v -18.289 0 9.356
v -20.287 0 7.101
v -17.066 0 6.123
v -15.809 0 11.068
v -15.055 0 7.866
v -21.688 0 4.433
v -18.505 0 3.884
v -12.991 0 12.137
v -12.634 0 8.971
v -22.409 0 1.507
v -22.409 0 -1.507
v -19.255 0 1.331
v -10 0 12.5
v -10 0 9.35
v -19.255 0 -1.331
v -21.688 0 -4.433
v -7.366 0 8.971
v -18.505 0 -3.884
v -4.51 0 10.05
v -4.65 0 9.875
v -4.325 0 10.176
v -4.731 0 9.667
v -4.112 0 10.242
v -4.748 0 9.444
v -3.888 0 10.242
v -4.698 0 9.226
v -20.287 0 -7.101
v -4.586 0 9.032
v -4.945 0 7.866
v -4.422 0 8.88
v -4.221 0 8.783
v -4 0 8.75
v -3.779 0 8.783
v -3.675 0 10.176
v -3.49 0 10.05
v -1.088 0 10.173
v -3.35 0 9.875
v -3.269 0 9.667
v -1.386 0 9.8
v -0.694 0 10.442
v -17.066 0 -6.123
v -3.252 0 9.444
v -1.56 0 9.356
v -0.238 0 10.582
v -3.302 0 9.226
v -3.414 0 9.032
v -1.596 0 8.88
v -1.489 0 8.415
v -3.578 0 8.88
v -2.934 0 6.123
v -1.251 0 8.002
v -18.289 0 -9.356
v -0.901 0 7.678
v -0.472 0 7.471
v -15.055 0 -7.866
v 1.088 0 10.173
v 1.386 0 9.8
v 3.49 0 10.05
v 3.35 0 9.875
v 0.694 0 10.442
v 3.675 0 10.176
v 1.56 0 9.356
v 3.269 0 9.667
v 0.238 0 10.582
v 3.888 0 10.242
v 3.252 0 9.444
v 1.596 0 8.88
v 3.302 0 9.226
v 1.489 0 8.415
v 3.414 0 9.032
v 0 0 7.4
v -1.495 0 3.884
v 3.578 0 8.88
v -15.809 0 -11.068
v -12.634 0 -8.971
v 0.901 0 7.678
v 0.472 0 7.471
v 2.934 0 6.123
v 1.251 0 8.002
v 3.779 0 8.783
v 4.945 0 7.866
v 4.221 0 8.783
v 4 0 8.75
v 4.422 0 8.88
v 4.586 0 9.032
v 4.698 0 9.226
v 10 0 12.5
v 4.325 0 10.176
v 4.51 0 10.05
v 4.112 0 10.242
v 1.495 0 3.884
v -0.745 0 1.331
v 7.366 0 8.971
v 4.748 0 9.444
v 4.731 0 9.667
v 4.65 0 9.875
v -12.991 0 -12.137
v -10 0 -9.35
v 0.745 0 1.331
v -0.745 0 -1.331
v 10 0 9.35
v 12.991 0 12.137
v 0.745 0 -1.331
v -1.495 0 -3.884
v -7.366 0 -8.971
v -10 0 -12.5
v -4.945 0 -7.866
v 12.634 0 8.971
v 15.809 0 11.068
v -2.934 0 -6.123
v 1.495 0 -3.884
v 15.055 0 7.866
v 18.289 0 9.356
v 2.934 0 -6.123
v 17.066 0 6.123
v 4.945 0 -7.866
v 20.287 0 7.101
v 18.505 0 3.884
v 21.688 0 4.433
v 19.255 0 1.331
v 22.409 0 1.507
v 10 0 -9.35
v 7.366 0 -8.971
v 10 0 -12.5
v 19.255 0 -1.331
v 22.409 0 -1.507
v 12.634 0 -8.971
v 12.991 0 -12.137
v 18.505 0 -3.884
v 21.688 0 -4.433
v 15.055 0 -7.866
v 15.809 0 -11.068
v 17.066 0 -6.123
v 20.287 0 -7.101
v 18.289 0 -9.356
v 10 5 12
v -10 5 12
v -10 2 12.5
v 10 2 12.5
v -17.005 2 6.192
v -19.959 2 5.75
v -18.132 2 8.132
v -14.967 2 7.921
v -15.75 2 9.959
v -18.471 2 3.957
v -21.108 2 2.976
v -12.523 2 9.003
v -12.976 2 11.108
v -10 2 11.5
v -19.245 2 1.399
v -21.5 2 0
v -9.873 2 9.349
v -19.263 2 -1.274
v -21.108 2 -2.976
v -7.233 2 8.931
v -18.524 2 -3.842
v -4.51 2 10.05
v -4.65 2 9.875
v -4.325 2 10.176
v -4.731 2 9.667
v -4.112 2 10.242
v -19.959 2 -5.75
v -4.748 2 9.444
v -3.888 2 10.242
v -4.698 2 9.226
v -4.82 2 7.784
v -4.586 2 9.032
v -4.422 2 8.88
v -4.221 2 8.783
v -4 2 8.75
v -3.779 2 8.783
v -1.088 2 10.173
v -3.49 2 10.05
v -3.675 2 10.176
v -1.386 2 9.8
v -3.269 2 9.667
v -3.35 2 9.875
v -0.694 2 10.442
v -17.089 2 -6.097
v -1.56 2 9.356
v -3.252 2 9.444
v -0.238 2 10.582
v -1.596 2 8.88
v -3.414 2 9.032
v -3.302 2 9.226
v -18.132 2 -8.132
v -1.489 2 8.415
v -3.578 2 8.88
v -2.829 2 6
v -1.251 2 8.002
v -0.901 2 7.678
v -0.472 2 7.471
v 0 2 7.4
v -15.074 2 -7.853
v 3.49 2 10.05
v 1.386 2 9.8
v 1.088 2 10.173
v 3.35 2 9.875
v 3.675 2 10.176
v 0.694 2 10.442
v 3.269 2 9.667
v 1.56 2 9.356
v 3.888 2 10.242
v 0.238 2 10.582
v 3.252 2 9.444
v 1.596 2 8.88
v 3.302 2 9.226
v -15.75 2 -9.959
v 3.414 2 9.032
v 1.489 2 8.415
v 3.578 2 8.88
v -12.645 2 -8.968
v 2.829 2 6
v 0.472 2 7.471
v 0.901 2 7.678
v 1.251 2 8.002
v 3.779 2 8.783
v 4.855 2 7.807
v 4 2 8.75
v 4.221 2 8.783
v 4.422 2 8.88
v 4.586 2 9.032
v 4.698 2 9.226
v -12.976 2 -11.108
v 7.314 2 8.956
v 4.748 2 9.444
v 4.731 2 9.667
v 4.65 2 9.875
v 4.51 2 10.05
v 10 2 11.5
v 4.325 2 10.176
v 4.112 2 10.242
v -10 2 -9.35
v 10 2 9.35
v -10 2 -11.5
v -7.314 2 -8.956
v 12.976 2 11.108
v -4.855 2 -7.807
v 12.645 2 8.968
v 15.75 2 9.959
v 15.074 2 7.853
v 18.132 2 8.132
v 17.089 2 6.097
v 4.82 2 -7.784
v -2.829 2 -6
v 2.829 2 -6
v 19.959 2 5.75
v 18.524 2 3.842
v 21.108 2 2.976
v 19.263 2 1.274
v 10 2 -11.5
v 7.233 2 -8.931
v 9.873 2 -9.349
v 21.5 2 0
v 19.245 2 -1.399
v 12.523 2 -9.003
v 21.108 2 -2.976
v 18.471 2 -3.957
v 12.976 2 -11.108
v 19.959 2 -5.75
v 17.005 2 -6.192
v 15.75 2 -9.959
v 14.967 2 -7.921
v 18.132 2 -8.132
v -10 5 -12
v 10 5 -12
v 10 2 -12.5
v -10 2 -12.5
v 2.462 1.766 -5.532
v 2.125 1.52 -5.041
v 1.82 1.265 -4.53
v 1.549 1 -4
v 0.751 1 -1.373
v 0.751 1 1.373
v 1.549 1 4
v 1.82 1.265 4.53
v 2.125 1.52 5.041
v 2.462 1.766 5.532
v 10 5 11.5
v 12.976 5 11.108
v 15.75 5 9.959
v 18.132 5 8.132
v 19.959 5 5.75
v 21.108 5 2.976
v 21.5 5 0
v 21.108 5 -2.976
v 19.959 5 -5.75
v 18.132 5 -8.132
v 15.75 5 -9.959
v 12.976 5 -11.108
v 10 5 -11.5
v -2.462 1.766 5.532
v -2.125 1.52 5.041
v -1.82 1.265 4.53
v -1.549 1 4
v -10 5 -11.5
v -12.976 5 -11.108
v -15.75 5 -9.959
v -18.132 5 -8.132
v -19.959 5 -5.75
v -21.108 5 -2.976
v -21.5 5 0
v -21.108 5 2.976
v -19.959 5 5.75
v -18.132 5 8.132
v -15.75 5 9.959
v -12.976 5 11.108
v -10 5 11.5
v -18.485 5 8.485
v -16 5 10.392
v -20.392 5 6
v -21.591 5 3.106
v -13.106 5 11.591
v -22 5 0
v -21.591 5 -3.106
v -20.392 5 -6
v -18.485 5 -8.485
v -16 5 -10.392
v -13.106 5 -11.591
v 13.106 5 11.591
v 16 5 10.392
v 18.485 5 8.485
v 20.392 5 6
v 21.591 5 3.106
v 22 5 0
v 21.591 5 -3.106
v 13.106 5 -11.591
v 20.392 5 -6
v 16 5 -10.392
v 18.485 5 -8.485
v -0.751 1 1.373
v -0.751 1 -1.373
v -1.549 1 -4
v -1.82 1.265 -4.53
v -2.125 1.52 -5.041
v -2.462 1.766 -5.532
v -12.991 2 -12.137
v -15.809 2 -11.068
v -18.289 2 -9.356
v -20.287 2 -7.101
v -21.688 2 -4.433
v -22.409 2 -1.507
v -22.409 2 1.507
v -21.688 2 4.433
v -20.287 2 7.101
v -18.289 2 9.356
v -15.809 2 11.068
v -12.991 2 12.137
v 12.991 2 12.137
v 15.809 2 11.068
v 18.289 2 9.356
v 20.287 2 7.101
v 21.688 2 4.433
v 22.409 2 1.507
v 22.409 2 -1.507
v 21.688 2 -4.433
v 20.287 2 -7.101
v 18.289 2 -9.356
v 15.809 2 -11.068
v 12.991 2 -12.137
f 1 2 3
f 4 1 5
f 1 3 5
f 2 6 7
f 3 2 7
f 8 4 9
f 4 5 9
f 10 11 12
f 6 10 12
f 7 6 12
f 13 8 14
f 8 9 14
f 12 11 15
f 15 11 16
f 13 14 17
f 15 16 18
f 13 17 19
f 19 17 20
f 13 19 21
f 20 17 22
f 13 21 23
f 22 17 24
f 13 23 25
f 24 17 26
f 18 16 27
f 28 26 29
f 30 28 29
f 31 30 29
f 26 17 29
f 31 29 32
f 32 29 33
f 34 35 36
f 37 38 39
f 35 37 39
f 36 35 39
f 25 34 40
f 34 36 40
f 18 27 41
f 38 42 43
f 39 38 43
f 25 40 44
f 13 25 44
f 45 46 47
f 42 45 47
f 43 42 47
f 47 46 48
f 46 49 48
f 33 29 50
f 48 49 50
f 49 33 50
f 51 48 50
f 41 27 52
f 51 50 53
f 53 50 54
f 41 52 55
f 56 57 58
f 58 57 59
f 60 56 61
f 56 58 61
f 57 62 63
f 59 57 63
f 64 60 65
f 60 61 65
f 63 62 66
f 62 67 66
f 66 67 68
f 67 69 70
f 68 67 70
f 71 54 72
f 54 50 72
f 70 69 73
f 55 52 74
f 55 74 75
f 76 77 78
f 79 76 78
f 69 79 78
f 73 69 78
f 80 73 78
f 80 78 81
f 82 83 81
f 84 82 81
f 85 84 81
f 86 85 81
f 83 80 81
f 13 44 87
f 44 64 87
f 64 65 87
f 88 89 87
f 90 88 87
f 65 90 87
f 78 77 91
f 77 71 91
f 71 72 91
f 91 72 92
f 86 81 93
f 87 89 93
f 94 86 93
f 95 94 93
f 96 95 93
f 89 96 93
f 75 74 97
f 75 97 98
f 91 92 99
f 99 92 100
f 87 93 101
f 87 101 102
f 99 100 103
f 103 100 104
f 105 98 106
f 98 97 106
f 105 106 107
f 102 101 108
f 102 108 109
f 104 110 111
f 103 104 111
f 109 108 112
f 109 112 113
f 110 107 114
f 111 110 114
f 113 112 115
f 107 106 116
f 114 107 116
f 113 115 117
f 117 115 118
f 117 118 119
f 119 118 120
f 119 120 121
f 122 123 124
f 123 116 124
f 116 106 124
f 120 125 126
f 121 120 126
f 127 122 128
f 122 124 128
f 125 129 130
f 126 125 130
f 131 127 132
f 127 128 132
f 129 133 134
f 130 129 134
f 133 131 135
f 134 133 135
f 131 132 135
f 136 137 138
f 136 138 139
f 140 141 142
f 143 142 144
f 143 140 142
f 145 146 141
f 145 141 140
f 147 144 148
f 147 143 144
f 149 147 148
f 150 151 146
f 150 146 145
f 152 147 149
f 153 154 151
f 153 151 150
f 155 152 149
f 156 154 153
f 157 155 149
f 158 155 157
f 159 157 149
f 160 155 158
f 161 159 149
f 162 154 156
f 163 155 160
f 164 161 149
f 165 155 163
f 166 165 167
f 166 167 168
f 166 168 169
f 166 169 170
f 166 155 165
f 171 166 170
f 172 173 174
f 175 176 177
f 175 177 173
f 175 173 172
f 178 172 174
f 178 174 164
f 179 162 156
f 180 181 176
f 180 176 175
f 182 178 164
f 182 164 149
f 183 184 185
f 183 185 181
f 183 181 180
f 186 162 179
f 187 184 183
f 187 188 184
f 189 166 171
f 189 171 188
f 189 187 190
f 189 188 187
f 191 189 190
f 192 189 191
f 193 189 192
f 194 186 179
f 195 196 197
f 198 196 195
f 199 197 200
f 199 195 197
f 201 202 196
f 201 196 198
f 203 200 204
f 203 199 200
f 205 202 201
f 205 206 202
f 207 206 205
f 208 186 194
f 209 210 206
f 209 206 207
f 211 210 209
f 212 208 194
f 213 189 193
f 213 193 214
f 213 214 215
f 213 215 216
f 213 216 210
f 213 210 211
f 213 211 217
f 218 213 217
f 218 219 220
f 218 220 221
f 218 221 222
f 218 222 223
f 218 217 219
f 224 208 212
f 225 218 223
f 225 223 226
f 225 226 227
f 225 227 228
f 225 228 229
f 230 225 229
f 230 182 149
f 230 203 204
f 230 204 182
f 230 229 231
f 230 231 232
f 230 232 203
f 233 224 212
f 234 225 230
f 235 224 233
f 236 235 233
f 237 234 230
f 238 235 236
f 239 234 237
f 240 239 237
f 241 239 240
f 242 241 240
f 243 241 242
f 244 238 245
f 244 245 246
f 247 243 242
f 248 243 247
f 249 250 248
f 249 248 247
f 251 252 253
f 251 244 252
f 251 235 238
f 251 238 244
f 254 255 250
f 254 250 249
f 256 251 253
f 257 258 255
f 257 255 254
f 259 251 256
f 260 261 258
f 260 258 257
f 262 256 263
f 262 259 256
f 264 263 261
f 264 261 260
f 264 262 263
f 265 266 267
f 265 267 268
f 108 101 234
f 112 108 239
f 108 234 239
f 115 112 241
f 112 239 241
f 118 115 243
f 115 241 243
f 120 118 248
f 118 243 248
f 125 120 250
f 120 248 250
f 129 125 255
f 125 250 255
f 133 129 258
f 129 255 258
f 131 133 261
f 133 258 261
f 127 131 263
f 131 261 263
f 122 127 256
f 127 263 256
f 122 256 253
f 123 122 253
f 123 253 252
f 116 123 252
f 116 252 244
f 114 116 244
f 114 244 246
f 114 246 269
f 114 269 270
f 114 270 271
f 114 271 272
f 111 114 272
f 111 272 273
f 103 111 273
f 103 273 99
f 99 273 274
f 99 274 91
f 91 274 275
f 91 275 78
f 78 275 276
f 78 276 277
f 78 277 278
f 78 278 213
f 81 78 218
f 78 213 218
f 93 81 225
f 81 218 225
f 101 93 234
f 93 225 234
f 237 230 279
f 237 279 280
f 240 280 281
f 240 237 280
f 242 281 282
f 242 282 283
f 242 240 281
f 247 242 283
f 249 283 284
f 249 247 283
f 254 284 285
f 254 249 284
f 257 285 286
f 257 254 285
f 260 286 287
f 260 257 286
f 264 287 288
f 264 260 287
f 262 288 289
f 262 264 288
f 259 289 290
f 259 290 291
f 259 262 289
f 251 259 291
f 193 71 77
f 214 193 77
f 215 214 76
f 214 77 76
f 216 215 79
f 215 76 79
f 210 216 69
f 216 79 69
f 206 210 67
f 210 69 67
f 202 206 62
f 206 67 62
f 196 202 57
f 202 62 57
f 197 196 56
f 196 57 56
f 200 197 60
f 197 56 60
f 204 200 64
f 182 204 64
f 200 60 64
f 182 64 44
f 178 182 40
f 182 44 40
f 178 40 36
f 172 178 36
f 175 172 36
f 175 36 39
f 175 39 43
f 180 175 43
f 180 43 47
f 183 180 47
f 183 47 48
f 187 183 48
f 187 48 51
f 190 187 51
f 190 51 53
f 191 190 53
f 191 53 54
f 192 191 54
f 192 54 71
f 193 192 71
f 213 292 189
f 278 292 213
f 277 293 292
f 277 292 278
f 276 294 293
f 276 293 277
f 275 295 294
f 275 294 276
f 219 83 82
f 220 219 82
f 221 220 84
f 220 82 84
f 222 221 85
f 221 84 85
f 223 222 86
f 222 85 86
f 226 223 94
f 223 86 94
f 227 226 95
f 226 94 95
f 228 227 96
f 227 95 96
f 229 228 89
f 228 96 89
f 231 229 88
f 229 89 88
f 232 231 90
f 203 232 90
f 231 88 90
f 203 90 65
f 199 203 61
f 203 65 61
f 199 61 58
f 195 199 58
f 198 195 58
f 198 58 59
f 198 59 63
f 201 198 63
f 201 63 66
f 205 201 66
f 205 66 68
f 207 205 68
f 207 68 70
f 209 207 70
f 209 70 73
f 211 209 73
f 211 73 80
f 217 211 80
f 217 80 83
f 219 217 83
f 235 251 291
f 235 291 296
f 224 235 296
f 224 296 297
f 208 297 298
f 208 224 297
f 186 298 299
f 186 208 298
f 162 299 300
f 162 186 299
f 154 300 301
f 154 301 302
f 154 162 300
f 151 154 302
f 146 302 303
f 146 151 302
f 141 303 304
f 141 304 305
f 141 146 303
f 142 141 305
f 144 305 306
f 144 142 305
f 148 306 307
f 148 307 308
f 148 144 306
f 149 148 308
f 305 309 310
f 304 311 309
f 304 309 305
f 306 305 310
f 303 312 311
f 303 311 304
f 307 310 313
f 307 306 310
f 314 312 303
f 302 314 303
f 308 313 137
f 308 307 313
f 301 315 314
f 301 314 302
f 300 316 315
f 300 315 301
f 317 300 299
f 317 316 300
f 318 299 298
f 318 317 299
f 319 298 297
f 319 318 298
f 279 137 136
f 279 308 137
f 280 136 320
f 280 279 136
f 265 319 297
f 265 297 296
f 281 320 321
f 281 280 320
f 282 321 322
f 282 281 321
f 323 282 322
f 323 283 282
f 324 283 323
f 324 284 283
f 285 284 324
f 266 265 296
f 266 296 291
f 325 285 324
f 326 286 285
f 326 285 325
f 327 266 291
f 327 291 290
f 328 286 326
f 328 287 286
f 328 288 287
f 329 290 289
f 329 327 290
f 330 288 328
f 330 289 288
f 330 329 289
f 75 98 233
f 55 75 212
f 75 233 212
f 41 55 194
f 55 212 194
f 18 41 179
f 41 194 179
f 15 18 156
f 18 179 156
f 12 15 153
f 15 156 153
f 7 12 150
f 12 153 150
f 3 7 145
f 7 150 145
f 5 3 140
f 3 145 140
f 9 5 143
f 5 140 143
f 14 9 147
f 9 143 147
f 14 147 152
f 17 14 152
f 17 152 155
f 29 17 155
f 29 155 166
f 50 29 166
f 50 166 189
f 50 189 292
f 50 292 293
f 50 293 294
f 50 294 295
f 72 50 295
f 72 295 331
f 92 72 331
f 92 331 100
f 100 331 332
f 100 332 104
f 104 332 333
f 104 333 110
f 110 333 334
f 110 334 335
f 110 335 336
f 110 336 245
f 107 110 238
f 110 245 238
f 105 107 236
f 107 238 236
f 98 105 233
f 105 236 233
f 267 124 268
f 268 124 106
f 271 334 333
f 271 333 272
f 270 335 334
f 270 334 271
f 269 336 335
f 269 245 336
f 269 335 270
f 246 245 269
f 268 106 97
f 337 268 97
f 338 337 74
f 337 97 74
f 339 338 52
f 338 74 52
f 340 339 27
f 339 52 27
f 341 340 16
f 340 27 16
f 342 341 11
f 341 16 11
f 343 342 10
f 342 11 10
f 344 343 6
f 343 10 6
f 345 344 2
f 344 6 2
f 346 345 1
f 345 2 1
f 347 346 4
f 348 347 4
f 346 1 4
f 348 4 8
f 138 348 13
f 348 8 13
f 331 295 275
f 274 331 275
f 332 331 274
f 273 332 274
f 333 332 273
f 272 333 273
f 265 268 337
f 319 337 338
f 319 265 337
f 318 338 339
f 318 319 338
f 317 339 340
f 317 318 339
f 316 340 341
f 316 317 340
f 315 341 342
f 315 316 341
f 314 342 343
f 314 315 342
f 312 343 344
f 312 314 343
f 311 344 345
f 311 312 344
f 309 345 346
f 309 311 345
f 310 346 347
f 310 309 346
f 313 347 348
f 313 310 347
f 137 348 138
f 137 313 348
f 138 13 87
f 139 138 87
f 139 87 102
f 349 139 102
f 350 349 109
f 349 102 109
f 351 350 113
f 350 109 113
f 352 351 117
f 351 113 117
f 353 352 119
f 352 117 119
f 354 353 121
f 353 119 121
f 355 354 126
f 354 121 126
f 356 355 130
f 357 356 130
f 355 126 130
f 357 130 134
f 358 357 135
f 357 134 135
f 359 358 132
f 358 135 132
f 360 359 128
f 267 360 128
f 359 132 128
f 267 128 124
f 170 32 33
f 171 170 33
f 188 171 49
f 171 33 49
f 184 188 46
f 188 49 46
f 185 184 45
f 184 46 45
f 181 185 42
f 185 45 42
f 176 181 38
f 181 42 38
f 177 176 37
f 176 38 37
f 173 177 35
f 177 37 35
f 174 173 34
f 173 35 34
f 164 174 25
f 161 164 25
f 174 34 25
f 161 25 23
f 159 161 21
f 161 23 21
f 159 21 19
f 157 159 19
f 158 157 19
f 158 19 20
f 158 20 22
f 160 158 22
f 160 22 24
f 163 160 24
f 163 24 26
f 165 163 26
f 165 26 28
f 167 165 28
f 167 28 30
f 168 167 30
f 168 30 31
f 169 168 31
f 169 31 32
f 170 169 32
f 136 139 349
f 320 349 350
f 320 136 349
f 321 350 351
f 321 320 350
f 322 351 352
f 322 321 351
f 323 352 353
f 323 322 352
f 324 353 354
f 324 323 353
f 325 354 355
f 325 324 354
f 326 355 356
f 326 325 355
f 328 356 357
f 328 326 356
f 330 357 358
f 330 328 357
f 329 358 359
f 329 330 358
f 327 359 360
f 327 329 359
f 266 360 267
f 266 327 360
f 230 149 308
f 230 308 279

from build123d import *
from OCP.BRepFilletAPI import BRepFilletAPI_MakeChamfer

# Parameters (mm, degrees)
BOSS_EXTRUDE1_DEPTH = 2
SKETCH2_R           = 9.349999999999996
CUT_EXTRUDE1_DEPTH  = 26.81666128685116
BOSS_EXTRUDE2_DEPTH = 3
CHAMFER1_SIZE       = 3
CHAMFER1_SIZE2      = 0.5
SKETCH4_W           = 15.000000000000002
SKETCH4_H           = 12
CUT_EXTRUDE2_DEPTH  = 1
CHAMFER2_SIZE       = 1
CHAMFER2_SIZE_2     = 2
SKETCH5_R           = 1.6000000000000005
SKETCH5_R_2         = 0.75
SKETCH5_R_3         = 0.7500000000000004
CUT_EXTRUDE3_DEPTH  = 27.22022120425378


with BuildPart() as part:
    # Sketch1 → Boss-Extrude1 (new body)
    with BuildSketch(Plane(origin=(0, 0, 0), x_dir=(1, 0, 0), z_dir=(0, 1, 0))):
        with BuildLine():
            Line((-22.5, 0), (-10, 0))
            Line((-10, 0), (1.421e-14, 0))
            Line((1.351e-14, 0), (-3.6e-16, 12.499999999999996))
            Line((0, 12.499999999999996), (-9.999999999999998, 12.499999999999996))
            ThreePointArc((-10.000000000000007, 12.499999999999996), (-18.83883476483184, 8.83883476483184), (-22.499999999999993, 7.9e-16))
        make_face()
        with BuildLine():
            Line((1.421e-14, 0), (-10, 0))
            Line((-10, 0), (-22.5, 0))
            ThreePointArc((-22.499999999999993, 7.9e-16), (-18.83883476483183, -8.83883476483185), (-9.999999999999972, -12.499999999999993))
            Line((-9.999999999999973, -12.499999999999996), (2.665e-14, -12.499999999999996))
            Line((2.739e-14, -12.499999999999996), (1.351e-14, 0))
        make_face()
        with BuildLine():
            Line((10, 0), (1.421e-14, 0))
            Line((1.351e-14, 0), (2.739e-14, -12.499999999999996))
            Line((2.665e-14, -12.499999999999996), (10.000000000000012, -12.499999999999996))
            ThreePointArc((10.000000000000012, -12.499999999999995), (18.838834764831844, -8.838834764831835), (22.499999999999993, 1.01e-15))
            Line((22.5, 0), (10, 0))
        make_face()
        with BuildLine():
            Line((-3.6e-16, 12.499999999999996), (1.351e-14, 0))
            Line((1.421e-14, 0), (10, 0))
            Line((10, 0), (22.5, 0))
            ThreePointArc((22.499999999999993, 1.01e-15), (18.83883476483184, 8.83883476483184), (10, 12.499999999999995))
            Line((9.999999999999998, 12.499999999999996), (0, 12.499999999999996))
        make_face()
    extrude(amount=BOSS_EXTRUDE1_DEPTH)

    # Sketch2 → Cut-Extrude1 (cut, through all)
    with BuildSketch(Plane(origin=(0, 2, 0), x_dir=(1, 0, 0), z_dir=(0, 1, 0))):
        with Locations(Location((10, 0, 0), (0, 0, 270))):
            Circle(SKETCH2_R)
        with Locations(Location((-10, 0, 0), (0, 0, 90))):
            Circle(SKETCH2_R)
    extrude(amount=-CUT_EXTRUDE1_DEPTH, mode=Mode.SUBTRACT)

    # Sketch3 → Boss-Extrude2 (add)
    with BuildSketch(Plane(origin=(0, 2, 0), x_dir=(1, 0, 0), z_dir=(0, 1, 0))):
        with BuildLine():
            Line((-9.99999999999998, -12.499999999999996), (10.000000000000009, -12.499999999999996))
            ThreePointArc((10.000000000000009, -12.499999999999996), (22.499999999999996, 2.78e-15), (10, 12.499999999999996))
            Line((10, 12.499999999999996), (-9.999999999999998, 12.499999999999996))
            ThreePointArc((-9.999999999999998, 12.499999999999996), (-22.499999999999996, -9.57e-15), (-9.99999999999998, -12.499999999999996))
        make_face()
        with BuildLine():
            Line((9.999999999999998, 11.499999999999996), (-9.999999999999998, 11.499999999999996))
            ThreePointArc((-9.999999999999998, 11.499999999999996), (-21.499999999999996, -8.81e-15), (-9.99999999999998, -11.499999999999996))
            Line((-9.99999999999998, -11.499999999999996), (10.000000000000012, -11.499999999999996))
            ThreePointArc((10.000000000000012, -11.499999999999996), (21.499999999999996, 7.66e-15), (9.999999999999998, 11.499999999999996))
        make_face(mode=Mode.SUBTRACT)
    extrude(amount=BOSS_EXTRUDE2_DEPTH)

    # Chamfer1: one chamfer whose edges measure the first distance from different faces: ONE call of the kernel's chamfer builder (chamfer() names one face for all edges)
    chamfer1_edges_1 = [part.edges().sort_by_distance(p)[0] for p in [
        (22.5, 5, -1.79e-15),
    ]]
    chamfer1_side_1 = [part.faces().sort_by_distance(p)[0] for p in [
        (22.499999999999993, 2.5, -1.478e-14),
    ]]
    chamfer1_edges_2 = [part.edges().sort_by_distance(p)[0] for p in [
        (0, 5, -12.499999999999996),
    ]]
    chamfer1_side_2 = [part.faces().sort_by_distance(p)[0] for p in [
        (-4.6e-16, 2.5, -12.499999999999996),
    ]]
    chamfer1_edges_3 = [part.edges().sort_by_distance(p)[0] for p in [
        (-22.499999999999993, 5, 1.178e-14),
    ]]
    chamfer1_side_3 = [part.faces().sort_by_distance(p)[0] for p in [
        (-22.499999999999993, 2.5, 1.611e-14),
    ]]
    chamfer1_edges_4 = [part.edges().sort_by_distance(p)[0] for p in [
        (1.421e-14, 5, 12.499999999999996),
    ]]
    chamfer1_side_4 = [part.faces().sort_by_distance(p)[0] for p in [
        (1.744e-14, 2.5, 12.499999999999996),
    ]]
    chamfer1 = BRepFilletAPI_MakeChamfer(part.part.solid().wrapped)
    for e in chamfer1_edges_1:
        chamfer1.Add(CHAMFER1_SIZE, CHAMFER1_SIZE2, e.wrapped, chamfer1_side_1[0].wrapped)  # the first distance lies on this face
    for e in chamfer1_edges_2:
        chamfer1.Add(CHAMFER1_SIZE, CHAMFER1_SIZE2, e.wrapped, chamfer1_side_2[0].wrapped)  # the first distance lies on this face
    for e in chamfer1_edges_3:
        chamfer1.Add(CHAMFER1_SIZE, CHAMFER1_SIZE2, e.wrapped, chamfer1_side_3[0].wrapped)  # the first distance lies on this face
    for e in chamfer1_edges_4:
        chamfer1.Add(CHAMFER1_SIZE, CHAMFER1_SIZE2, e.wrapped, chamfer1_side_4[0].wrapped)  # the first distance lies on this face
    add(Compound.cast(chamfer1.Shape()), mode=Mode.REPLACE)

    # Sketch4 → Cut-Extrude2 (cut)
    with BuildSketch(Plane(origin=(0, 2, 0), x_dir=(1, 0, 0), z_dir=(0, 1, 0))):
        Rectangle(SKETCH4_W, SKETCH4_H)
    extrude(amount=-CUT_EXTRUDE2_DEPTH, mode=Mode.SUBTRACT)

    # Chamfer2
    chamfer2_edges_1 = [part.edges().sort_by_distance(p)[0] for p in [
        (-8.9e-16, 1, 6),
    ]]
    chamfer2_side_1 = [part.faces().sort_by_distance(p)[0] for p in [
        (-8.9e-16, 1.02, 6),
    ]]
    chamfer2_edges_2 = [part.edges().sort_by_distance(p)[0] for p in [
        (8.9e-16, 1, -6),
    ]]
    chamfer2_side_2 = [part.faces().sort_by_distance(p)[0] for p in [
        (8.9e-16, 1, -5.98),
    ]]
    chamfer2 = BRepFilletAPI_MakeChamfer(part.part.solid().wrapped)
    for e in chamfer2_edges_1:
        chamfer2.Add(CHAMFER2_SIZE - 0.0001, CHAMFER2_SIZE_2 - 0.0001, e.wrapped, chamfer2_side_1[0].wrapped)
    for e in chamfer2_edges_2:
        chamfer2.Add(CHAMFER2_SIZE_2 - 0.0001, CHAMFER2_SIZE - 0.0001, e.wrapped, chamfer2_side_2[0].wrapped)
    add(Compound.cast(chamfer2.Shape()), mode=Mode.REPLACE)  # a hair under: the kernel refuses the full size

    # Sketch5 → Cut-Extrude3 (cut, through all)
    with BuildSketch(Plane.XZ):
        with Locations(Location((0, 8.999999999999998, 0), (0, 0, 270))):
            Circle(SKETCH5_R)
        with Locations(Location((-4.000000000000002, 9.499999999999998, 0), (0, 0, 270))):
            Circle(SKETCH5_R_2)
        with Locations(Location((3.9999999999999982, 9.499999999999998, 0), (0, 0, 270))):
            Circle(SKETCH5_R_3)
    extrude(amount=-CUT_EXTRUDE3_DEPTH, mode=Mode.SUBTRACT)


solid = part.part
